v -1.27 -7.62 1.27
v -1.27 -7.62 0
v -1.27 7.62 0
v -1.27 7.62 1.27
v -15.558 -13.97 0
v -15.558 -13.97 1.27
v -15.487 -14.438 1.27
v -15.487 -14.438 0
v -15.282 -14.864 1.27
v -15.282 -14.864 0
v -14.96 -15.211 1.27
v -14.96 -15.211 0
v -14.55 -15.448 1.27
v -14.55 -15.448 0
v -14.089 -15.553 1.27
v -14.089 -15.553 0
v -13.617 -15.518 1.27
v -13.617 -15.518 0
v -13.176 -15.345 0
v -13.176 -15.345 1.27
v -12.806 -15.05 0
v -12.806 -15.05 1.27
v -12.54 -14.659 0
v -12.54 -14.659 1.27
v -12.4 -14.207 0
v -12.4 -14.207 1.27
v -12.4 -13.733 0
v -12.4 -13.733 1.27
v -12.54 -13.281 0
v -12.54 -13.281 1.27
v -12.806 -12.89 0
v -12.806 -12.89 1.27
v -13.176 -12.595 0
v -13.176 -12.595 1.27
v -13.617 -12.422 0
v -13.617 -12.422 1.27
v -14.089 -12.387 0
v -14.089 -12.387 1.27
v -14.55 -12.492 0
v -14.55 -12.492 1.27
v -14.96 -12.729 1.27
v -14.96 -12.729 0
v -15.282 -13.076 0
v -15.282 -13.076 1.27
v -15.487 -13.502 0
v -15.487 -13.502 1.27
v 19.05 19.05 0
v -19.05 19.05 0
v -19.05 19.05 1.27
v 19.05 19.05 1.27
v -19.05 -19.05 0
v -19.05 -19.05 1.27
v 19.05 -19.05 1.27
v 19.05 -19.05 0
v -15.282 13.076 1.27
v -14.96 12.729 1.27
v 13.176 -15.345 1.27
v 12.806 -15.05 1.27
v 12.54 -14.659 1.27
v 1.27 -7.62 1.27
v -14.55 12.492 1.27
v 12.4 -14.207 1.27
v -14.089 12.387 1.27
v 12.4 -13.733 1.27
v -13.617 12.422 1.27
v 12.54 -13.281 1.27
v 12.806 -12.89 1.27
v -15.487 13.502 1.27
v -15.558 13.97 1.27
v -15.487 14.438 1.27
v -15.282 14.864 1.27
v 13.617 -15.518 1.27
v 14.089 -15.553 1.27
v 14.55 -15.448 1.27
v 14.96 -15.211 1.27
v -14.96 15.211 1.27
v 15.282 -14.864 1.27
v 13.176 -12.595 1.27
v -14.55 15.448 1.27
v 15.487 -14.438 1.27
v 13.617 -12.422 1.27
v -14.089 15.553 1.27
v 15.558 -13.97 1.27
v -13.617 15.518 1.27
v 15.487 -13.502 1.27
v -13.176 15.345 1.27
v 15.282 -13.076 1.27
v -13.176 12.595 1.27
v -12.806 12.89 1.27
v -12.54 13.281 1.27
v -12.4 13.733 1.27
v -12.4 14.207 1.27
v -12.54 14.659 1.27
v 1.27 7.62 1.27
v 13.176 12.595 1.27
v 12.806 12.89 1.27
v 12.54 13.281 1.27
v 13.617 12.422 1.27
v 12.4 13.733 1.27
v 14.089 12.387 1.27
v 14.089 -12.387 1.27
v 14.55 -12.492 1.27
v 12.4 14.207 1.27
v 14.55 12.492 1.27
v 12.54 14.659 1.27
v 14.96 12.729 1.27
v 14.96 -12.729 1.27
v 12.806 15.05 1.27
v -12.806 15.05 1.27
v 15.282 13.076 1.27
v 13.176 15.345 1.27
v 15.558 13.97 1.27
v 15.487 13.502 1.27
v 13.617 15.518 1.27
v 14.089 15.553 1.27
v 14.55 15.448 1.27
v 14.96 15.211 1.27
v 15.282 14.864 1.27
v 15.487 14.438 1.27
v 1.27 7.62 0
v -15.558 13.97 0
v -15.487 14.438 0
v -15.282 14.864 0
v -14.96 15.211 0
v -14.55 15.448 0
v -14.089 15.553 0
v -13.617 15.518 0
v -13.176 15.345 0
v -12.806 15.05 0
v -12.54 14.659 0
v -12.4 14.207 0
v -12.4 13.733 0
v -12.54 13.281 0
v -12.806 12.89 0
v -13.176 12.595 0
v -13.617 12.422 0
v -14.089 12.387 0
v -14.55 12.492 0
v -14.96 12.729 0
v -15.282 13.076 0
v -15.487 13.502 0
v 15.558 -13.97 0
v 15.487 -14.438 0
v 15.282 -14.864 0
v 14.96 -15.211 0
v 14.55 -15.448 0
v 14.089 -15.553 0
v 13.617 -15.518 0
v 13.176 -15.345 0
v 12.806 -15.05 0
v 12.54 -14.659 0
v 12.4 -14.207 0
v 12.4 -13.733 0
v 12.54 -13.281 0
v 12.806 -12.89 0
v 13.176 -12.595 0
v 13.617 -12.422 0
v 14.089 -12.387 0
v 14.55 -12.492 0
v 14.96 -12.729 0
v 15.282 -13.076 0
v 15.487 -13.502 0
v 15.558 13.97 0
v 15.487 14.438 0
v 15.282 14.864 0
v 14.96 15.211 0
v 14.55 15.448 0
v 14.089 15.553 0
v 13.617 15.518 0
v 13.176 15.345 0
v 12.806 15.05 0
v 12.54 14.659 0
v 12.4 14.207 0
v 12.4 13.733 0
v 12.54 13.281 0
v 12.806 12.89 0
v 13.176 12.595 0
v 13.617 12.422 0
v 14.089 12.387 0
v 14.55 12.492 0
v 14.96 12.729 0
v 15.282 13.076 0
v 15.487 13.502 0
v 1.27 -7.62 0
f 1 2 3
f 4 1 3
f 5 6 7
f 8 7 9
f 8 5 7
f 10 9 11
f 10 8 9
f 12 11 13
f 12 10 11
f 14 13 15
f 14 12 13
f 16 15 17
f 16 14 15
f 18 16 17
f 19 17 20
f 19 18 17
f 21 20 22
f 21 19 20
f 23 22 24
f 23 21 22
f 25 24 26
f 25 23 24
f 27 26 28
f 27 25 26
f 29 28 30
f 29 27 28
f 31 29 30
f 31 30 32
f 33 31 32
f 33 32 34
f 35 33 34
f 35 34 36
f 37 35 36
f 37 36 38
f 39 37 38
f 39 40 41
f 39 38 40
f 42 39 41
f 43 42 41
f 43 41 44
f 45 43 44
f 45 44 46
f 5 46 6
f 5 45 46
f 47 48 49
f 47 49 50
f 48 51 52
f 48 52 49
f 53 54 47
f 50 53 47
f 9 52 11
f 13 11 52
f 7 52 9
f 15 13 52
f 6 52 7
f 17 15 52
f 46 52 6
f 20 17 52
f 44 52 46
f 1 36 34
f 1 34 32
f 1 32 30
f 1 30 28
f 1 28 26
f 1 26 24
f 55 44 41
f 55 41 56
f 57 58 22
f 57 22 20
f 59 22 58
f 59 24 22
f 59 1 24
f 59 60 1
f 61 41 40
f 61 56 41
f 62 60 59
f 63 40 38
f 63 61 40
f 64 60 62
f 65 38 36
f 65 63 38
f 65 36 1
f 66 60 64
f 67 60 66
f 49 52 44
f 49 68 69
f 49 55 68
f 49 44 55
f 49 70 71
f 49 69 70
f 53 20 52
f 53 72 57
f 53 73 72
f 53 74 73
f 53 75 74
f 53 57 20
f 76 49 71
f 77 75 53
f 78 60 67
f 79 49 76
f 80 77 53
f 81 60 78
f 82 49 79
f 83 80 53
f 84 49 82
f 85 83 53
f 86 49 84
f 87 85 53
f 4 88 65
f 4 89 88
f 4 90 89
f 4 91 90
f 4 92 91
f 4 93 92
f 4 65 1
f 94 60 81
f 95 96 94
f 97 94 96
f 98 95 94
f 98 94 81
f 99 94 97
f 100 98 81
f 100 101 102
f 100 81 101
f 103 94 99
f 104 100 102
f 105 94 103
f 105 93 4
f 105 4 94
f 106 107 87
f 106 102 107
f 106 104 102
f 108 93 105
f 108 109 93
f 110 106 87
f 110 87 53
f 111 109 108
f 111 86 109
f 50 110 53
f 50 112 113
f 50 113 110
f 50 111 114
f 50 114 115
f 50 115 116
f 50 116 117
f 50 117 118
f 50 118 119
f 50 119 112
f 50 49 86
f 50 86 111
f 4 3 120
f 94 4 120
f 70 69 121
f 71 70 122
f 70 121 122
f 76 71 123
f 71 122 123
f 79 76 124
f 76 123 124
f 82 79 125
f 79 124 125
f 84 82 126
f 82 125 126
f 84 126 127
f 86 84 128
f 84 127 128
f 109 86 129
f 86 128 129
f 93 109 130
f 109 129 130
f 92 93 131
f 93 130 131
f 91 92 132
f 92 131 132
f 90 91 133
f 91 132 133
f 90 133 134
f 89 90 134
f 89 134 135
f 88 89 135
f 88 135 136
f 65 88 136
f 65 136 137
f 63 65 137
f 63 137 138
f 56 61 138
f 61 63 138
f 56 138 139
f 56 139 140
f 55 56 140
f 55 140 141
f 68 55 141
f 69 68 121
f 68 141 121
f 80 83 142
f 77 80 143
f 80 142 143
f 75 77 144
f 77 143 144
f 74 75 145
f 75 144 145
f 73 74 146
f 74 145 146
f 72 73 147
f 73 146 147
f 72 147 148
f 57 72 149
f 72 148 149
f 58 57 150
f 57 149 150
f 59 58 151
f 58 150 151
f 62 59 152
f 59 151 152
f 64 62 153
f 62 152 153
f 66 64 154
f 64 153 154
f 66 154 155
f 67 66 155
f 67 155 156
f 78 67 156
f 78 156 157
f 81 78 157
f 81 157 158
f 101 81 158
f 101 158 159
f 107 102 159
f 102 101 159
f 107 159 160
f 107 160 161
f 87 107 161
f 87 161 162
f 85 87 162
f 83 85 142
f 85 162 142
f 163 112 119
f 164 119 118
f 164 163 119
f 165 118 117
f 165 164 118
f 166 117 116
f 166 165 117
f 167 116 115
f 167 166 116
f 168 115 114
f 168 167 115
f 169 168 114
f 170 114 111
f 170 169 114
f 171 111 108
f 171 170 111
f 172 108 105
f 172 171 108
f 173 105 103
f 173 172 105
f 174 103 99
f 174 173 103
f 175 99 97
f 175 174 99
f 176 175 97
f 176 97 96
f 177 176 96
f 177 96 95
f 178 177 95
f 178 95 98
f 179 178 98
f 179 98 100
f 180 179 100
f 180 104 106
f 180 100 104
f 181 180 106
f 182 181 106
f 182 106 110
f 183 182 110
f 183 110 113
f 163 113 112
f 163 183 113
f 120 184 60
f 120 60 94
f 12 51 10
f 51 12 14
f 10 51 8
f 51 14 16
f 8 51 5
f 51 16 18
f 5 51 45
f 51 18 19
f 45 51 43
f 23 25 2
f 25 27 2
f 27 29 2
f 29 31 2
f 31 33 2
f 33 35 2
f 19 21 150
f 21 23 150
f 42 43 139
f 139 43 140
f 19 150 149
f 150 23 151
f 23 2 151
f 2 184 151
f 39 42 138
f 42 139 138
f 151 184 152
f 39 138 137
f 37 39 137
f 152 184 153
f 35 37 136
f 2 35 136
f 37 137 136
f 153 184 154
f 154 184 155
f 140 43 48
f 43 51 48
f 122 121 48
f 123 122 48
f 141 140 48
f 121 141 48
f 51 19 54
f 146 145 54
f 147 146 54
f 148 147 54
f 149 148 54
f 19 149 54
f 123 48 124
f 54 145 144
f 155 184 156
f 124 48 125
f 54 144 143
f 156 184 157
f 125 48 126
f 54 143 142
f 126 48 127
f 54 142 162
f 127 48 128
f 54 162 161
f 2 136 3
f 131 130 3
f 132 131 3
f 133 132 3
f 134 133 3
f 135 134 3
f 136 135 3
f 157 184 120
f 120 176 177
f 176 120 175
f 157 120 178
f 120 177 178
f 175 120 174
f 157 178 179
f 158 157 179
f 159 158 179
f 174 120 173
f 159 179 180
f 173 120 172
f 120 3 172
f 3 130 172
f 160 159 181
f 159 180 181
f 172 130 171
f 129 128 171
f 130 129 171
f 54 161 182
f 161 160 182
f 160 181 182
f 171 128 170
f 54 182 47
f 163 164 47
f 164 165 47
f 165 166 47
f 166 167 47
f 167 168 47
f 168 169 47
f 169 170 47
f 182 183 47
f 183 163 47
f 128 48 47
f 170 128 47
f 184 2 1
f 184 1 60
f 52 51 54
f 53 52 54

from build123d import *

# Parameters (mm, degrees)
F0_W     = 38.1
F0_H     = 38.1
F1_DEPTH = 1.27
F3_R     = 1.5875
F4_DEPTH = 25.4
F7_W     = 2.54
F7_H     = 15.24
F8_DEPTH = 25.4


with BuildPart() as f1:
    # F0 (on Top) → F1 (new body)
    with BuildSketch(Plane.XY):
        Rectangle(F0_W, F0_H)
    extrude(amount=F1_DEPTH)

    # F3 (on Top) → F4 (cut)
    with BuildSketch(Plane.XY):
        with Locations((13.97, 13.97)):
            Circle(F3_R)
    extrude(amount=F4_DEPTH, mode=Mode.SUBTRACT)

    # F5: F1 across plane


with BuildPart() as f1_1:
    add(f1.part)
    add(f1.part.mirror(Plane.YZ), mode=Mode.INTERSECT)

    # F6: F1 across plane


with BuildPart() as f1_2:
    add(f1_1.part)
    add(f1_1.part.mirror(Plane.XZ), mode=Mode.INTERSECT)

    # F7 (on Top) → F8 (cut)
    with BuildSketch(Plane.XY):
        Rectangle(F7_W, F7_H)
    extrude(amount=F8_DEPTH, mode=Mode.SUBTRACT)


solid = f1_2.part
